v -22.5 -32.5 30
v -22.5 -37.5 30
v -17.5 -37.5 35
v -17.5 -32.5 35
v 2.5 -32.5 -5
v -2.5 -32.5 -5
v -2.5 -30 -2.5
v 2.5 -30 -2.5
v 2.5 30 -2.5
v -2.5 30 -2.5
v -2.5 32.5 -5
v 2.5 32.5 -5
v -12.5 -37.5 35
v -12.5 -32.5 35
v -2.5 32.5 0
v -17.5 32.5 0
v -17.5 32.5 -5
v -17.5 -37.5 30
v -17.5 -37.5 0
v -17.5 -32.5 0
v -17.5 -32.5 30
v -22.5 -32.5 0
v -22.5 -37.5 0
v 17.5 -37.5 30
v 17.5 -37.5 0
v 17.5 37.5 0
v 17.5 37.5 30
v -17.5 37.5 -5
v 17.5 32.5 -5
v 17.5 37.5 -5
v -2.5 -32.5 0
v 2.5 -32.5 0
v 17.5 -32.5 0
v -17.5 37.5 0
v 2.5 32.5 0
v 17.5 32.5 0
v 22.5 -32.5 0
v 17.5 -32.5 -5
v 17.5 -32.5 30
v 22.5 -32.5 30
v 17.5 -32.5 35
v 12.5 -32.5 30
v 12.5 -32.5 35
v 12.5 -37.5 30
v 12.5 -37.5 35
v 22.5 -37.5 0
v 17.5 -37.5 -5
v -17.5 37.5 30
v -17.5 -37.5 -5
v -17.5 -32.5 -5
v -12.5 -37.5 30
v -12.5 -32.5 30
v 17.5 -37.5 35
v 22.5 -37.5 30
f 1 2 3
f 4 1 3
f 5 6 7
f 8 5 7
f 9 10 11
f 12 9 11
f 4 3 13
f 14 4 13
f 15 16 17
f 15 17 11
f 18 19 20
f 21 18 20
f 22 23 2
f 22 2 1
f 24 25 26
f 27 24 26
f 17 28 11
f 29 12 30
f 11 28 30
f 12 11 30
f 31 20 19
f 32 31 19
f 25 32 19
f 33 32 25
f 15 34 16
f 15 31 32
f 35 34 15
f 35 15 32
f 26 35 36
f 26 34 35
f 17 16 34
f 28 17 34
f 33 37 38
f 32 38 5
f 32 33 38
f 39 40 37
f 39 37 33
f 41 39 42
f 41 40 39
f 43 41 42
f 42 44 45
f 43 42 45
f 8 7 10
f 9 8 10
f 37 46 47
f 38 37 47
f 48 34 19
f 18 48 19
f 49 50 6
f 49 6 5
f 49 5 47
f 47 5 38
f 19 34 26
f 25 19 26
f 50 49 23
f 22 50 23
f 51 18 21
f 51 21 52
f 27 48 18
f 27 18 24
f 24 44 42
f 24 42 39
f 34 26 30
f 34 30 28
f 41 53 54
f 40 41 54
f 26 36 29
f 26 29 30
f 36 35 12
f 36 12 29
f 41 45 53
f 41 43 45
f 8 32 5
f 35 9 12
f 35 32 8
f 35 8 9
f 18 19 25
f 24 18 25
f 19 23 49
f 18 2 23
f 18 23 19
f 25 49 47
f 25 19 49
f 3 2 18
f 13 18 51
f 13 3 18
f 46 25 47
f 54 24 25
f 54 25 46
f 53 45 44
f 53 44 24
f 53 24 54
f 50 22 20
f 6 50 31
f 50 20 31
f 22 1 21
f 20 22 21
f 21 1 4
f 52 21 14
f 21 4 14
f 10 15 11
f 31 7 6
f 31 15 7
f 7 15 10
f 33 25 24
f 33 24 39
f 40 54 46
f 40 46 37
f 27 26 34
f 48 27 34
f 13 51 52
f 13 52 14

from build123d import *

# Parameters (mm, degrees)
F0_W     = 15
F0_H     = 32.5
F0_H_2   = 5
F0_W_2   = 5
F1_DEPTH = 30
F2_DEPTH = 5
F3_DEPTH = 35
F4_W     = 5
F4_H     = 5
F5_DEPTH = 5
F7_DEPTH = 5
F9_DEPTH = 75


# Not quite as in the source:
# - a feature names something its author has since deleted; it is built from what else it names


with BuildPart() as f1:
    # F0 (on Top) → F1 (new body)
    with BuildSketch(Plane.XY):
        Polygon((-2.5, 0), (0, 0), (2.5, 0), (2.5, 32.5), (-2.5, 32.5), align=None)
        with Locations((-10, 16.25)):
            Rectangle(F0_W, F0_H)
        Polygon((2.5, 0), (0, 0), (-2.5, 0), (-2.5, -32.5), (2.5, -32.5), align=None)
        with Locations((-10, -16.25)):
            Rectangle(F0_W, F0_H)
        with Locations((10, 16.25)):
            Rectangle(F0_W, F0_H)
        with Locations((10, -16.25)):
            Rectangle(F0_W, F0_H)
        Polygon((-2.5, 32.5), (2.5, 32.5), (2.5, 37.5), (0, 37.5), (-2.5, 37.5), align=None)
        with Locations((10, 35)):
            Rectangle(F0_W, F0_H_2)
        with Locations((-10, 35)):
            Rectangle(F0_W, F0_H_2)
        with Locations((10, -35)):
            Rectangle(F0_W, F0_H_2)
        with Locations((-10, -35)):
            Rectangle(F0_W, F0_H_2)
        with Locations((0, -35)):
            Rectangle(F0_W_2, F0_H_2)
    extrude(amount=F1_DEPTH)


with BuildPart() as f2:
    # F0 (on Top) → F2 (new body)
    with BuildSketch(Plane.XY):
        with Locations((-10, -35)):
            Rectangle(F0_W, F0_H_2)
        with Locations((-10, 35)):
            Rectangle(F0_W, F0_H_2)
        with Locations((10, -35)):
            Rectangle(F0_W, F0_H_2)
        Polygon((-2.5, 0), (0, 0), (2.5, 0), (2.5, 32.5), (-2.5, 32.5), align=None)
        with Locations((10, 35)):
            Rectangle(F0_W, F0_H_2)
        Polygon((-2.5, 32.5), (2.5, 32.5), (2.5, 37.5), (0, 37.5), (-2.5, 37.5), align=None)
        Polygon((2.5, 0), (0, 0), (-2.5, 0), (-2.5, -32.5), (2.5, -32.5), align=None)
        with Locations((0, -35)):
            Rectangle(F0_W_2, F0_H_2)
        with Locations((20, -35)):
            Rectangle(F0_W_2, F0_H_2)
        with Locations((-20, -35)):
            Rectangle(F0_W_2, F0_H_2)
    extrude(amount=-F2_DEPTH)

    # F0 (on Top) → F3 (join)
    with BuildSketch(Plane.XY):
        with Locations((-20, -35)):
            Rectangle(F0_W_2, F0_H_2)
        with Locations((20, -35)):
            Rectangle(F0_W_2, F0_H_2)
    extrude(amount=F3_DEPTH)

    # F4 (on face) → F5 (join)
    with BuildSketch(Plane.XZ.offset(37.5)):
        with Locations((-15, 32.5)):
            Rectangle(F4_W, F4_H)
        with Locations((15, 32.5)):
            Rectangle(F4_W, F4_H)
    extrude(amount=-F5_DEPTH)

    # F6 (on face) → F7 (cut)
    with BuildSketch(Plane(origin=(-2.5, 0, 0), x_dir=(0, -1, 0), z_dir=(-1, 0, 0))):
        Polygon((-30, -2.5), (-32.5, -5), (32.5, -5), (30, -2.5), align=None)
    extrude(amount=-F7_DEPTH, mode=Mode.SUBTRACT)

    # F8 (on face) → F9 (cut)
    with BuildSketch(Plane.XZ.offset(37.5)):
        Polygon((-22.5, 35), (-22.5, 30), (-17.5, 35), align=None)
        Polygon((17.5, 35), (22.5, 30), (22.5, 35), align=None)
        Polygon((-17.5, -5), (-22.5, 0), (-22.5, -5), align=None)
        Polygon((22.5, 0), (17.5, -5), (22.5, -5), align=None)
    extrude(amount=-F9_DEPTH, mode=Mode.SUBTRACT)


solid = Compound([f1.part, f2.part])
